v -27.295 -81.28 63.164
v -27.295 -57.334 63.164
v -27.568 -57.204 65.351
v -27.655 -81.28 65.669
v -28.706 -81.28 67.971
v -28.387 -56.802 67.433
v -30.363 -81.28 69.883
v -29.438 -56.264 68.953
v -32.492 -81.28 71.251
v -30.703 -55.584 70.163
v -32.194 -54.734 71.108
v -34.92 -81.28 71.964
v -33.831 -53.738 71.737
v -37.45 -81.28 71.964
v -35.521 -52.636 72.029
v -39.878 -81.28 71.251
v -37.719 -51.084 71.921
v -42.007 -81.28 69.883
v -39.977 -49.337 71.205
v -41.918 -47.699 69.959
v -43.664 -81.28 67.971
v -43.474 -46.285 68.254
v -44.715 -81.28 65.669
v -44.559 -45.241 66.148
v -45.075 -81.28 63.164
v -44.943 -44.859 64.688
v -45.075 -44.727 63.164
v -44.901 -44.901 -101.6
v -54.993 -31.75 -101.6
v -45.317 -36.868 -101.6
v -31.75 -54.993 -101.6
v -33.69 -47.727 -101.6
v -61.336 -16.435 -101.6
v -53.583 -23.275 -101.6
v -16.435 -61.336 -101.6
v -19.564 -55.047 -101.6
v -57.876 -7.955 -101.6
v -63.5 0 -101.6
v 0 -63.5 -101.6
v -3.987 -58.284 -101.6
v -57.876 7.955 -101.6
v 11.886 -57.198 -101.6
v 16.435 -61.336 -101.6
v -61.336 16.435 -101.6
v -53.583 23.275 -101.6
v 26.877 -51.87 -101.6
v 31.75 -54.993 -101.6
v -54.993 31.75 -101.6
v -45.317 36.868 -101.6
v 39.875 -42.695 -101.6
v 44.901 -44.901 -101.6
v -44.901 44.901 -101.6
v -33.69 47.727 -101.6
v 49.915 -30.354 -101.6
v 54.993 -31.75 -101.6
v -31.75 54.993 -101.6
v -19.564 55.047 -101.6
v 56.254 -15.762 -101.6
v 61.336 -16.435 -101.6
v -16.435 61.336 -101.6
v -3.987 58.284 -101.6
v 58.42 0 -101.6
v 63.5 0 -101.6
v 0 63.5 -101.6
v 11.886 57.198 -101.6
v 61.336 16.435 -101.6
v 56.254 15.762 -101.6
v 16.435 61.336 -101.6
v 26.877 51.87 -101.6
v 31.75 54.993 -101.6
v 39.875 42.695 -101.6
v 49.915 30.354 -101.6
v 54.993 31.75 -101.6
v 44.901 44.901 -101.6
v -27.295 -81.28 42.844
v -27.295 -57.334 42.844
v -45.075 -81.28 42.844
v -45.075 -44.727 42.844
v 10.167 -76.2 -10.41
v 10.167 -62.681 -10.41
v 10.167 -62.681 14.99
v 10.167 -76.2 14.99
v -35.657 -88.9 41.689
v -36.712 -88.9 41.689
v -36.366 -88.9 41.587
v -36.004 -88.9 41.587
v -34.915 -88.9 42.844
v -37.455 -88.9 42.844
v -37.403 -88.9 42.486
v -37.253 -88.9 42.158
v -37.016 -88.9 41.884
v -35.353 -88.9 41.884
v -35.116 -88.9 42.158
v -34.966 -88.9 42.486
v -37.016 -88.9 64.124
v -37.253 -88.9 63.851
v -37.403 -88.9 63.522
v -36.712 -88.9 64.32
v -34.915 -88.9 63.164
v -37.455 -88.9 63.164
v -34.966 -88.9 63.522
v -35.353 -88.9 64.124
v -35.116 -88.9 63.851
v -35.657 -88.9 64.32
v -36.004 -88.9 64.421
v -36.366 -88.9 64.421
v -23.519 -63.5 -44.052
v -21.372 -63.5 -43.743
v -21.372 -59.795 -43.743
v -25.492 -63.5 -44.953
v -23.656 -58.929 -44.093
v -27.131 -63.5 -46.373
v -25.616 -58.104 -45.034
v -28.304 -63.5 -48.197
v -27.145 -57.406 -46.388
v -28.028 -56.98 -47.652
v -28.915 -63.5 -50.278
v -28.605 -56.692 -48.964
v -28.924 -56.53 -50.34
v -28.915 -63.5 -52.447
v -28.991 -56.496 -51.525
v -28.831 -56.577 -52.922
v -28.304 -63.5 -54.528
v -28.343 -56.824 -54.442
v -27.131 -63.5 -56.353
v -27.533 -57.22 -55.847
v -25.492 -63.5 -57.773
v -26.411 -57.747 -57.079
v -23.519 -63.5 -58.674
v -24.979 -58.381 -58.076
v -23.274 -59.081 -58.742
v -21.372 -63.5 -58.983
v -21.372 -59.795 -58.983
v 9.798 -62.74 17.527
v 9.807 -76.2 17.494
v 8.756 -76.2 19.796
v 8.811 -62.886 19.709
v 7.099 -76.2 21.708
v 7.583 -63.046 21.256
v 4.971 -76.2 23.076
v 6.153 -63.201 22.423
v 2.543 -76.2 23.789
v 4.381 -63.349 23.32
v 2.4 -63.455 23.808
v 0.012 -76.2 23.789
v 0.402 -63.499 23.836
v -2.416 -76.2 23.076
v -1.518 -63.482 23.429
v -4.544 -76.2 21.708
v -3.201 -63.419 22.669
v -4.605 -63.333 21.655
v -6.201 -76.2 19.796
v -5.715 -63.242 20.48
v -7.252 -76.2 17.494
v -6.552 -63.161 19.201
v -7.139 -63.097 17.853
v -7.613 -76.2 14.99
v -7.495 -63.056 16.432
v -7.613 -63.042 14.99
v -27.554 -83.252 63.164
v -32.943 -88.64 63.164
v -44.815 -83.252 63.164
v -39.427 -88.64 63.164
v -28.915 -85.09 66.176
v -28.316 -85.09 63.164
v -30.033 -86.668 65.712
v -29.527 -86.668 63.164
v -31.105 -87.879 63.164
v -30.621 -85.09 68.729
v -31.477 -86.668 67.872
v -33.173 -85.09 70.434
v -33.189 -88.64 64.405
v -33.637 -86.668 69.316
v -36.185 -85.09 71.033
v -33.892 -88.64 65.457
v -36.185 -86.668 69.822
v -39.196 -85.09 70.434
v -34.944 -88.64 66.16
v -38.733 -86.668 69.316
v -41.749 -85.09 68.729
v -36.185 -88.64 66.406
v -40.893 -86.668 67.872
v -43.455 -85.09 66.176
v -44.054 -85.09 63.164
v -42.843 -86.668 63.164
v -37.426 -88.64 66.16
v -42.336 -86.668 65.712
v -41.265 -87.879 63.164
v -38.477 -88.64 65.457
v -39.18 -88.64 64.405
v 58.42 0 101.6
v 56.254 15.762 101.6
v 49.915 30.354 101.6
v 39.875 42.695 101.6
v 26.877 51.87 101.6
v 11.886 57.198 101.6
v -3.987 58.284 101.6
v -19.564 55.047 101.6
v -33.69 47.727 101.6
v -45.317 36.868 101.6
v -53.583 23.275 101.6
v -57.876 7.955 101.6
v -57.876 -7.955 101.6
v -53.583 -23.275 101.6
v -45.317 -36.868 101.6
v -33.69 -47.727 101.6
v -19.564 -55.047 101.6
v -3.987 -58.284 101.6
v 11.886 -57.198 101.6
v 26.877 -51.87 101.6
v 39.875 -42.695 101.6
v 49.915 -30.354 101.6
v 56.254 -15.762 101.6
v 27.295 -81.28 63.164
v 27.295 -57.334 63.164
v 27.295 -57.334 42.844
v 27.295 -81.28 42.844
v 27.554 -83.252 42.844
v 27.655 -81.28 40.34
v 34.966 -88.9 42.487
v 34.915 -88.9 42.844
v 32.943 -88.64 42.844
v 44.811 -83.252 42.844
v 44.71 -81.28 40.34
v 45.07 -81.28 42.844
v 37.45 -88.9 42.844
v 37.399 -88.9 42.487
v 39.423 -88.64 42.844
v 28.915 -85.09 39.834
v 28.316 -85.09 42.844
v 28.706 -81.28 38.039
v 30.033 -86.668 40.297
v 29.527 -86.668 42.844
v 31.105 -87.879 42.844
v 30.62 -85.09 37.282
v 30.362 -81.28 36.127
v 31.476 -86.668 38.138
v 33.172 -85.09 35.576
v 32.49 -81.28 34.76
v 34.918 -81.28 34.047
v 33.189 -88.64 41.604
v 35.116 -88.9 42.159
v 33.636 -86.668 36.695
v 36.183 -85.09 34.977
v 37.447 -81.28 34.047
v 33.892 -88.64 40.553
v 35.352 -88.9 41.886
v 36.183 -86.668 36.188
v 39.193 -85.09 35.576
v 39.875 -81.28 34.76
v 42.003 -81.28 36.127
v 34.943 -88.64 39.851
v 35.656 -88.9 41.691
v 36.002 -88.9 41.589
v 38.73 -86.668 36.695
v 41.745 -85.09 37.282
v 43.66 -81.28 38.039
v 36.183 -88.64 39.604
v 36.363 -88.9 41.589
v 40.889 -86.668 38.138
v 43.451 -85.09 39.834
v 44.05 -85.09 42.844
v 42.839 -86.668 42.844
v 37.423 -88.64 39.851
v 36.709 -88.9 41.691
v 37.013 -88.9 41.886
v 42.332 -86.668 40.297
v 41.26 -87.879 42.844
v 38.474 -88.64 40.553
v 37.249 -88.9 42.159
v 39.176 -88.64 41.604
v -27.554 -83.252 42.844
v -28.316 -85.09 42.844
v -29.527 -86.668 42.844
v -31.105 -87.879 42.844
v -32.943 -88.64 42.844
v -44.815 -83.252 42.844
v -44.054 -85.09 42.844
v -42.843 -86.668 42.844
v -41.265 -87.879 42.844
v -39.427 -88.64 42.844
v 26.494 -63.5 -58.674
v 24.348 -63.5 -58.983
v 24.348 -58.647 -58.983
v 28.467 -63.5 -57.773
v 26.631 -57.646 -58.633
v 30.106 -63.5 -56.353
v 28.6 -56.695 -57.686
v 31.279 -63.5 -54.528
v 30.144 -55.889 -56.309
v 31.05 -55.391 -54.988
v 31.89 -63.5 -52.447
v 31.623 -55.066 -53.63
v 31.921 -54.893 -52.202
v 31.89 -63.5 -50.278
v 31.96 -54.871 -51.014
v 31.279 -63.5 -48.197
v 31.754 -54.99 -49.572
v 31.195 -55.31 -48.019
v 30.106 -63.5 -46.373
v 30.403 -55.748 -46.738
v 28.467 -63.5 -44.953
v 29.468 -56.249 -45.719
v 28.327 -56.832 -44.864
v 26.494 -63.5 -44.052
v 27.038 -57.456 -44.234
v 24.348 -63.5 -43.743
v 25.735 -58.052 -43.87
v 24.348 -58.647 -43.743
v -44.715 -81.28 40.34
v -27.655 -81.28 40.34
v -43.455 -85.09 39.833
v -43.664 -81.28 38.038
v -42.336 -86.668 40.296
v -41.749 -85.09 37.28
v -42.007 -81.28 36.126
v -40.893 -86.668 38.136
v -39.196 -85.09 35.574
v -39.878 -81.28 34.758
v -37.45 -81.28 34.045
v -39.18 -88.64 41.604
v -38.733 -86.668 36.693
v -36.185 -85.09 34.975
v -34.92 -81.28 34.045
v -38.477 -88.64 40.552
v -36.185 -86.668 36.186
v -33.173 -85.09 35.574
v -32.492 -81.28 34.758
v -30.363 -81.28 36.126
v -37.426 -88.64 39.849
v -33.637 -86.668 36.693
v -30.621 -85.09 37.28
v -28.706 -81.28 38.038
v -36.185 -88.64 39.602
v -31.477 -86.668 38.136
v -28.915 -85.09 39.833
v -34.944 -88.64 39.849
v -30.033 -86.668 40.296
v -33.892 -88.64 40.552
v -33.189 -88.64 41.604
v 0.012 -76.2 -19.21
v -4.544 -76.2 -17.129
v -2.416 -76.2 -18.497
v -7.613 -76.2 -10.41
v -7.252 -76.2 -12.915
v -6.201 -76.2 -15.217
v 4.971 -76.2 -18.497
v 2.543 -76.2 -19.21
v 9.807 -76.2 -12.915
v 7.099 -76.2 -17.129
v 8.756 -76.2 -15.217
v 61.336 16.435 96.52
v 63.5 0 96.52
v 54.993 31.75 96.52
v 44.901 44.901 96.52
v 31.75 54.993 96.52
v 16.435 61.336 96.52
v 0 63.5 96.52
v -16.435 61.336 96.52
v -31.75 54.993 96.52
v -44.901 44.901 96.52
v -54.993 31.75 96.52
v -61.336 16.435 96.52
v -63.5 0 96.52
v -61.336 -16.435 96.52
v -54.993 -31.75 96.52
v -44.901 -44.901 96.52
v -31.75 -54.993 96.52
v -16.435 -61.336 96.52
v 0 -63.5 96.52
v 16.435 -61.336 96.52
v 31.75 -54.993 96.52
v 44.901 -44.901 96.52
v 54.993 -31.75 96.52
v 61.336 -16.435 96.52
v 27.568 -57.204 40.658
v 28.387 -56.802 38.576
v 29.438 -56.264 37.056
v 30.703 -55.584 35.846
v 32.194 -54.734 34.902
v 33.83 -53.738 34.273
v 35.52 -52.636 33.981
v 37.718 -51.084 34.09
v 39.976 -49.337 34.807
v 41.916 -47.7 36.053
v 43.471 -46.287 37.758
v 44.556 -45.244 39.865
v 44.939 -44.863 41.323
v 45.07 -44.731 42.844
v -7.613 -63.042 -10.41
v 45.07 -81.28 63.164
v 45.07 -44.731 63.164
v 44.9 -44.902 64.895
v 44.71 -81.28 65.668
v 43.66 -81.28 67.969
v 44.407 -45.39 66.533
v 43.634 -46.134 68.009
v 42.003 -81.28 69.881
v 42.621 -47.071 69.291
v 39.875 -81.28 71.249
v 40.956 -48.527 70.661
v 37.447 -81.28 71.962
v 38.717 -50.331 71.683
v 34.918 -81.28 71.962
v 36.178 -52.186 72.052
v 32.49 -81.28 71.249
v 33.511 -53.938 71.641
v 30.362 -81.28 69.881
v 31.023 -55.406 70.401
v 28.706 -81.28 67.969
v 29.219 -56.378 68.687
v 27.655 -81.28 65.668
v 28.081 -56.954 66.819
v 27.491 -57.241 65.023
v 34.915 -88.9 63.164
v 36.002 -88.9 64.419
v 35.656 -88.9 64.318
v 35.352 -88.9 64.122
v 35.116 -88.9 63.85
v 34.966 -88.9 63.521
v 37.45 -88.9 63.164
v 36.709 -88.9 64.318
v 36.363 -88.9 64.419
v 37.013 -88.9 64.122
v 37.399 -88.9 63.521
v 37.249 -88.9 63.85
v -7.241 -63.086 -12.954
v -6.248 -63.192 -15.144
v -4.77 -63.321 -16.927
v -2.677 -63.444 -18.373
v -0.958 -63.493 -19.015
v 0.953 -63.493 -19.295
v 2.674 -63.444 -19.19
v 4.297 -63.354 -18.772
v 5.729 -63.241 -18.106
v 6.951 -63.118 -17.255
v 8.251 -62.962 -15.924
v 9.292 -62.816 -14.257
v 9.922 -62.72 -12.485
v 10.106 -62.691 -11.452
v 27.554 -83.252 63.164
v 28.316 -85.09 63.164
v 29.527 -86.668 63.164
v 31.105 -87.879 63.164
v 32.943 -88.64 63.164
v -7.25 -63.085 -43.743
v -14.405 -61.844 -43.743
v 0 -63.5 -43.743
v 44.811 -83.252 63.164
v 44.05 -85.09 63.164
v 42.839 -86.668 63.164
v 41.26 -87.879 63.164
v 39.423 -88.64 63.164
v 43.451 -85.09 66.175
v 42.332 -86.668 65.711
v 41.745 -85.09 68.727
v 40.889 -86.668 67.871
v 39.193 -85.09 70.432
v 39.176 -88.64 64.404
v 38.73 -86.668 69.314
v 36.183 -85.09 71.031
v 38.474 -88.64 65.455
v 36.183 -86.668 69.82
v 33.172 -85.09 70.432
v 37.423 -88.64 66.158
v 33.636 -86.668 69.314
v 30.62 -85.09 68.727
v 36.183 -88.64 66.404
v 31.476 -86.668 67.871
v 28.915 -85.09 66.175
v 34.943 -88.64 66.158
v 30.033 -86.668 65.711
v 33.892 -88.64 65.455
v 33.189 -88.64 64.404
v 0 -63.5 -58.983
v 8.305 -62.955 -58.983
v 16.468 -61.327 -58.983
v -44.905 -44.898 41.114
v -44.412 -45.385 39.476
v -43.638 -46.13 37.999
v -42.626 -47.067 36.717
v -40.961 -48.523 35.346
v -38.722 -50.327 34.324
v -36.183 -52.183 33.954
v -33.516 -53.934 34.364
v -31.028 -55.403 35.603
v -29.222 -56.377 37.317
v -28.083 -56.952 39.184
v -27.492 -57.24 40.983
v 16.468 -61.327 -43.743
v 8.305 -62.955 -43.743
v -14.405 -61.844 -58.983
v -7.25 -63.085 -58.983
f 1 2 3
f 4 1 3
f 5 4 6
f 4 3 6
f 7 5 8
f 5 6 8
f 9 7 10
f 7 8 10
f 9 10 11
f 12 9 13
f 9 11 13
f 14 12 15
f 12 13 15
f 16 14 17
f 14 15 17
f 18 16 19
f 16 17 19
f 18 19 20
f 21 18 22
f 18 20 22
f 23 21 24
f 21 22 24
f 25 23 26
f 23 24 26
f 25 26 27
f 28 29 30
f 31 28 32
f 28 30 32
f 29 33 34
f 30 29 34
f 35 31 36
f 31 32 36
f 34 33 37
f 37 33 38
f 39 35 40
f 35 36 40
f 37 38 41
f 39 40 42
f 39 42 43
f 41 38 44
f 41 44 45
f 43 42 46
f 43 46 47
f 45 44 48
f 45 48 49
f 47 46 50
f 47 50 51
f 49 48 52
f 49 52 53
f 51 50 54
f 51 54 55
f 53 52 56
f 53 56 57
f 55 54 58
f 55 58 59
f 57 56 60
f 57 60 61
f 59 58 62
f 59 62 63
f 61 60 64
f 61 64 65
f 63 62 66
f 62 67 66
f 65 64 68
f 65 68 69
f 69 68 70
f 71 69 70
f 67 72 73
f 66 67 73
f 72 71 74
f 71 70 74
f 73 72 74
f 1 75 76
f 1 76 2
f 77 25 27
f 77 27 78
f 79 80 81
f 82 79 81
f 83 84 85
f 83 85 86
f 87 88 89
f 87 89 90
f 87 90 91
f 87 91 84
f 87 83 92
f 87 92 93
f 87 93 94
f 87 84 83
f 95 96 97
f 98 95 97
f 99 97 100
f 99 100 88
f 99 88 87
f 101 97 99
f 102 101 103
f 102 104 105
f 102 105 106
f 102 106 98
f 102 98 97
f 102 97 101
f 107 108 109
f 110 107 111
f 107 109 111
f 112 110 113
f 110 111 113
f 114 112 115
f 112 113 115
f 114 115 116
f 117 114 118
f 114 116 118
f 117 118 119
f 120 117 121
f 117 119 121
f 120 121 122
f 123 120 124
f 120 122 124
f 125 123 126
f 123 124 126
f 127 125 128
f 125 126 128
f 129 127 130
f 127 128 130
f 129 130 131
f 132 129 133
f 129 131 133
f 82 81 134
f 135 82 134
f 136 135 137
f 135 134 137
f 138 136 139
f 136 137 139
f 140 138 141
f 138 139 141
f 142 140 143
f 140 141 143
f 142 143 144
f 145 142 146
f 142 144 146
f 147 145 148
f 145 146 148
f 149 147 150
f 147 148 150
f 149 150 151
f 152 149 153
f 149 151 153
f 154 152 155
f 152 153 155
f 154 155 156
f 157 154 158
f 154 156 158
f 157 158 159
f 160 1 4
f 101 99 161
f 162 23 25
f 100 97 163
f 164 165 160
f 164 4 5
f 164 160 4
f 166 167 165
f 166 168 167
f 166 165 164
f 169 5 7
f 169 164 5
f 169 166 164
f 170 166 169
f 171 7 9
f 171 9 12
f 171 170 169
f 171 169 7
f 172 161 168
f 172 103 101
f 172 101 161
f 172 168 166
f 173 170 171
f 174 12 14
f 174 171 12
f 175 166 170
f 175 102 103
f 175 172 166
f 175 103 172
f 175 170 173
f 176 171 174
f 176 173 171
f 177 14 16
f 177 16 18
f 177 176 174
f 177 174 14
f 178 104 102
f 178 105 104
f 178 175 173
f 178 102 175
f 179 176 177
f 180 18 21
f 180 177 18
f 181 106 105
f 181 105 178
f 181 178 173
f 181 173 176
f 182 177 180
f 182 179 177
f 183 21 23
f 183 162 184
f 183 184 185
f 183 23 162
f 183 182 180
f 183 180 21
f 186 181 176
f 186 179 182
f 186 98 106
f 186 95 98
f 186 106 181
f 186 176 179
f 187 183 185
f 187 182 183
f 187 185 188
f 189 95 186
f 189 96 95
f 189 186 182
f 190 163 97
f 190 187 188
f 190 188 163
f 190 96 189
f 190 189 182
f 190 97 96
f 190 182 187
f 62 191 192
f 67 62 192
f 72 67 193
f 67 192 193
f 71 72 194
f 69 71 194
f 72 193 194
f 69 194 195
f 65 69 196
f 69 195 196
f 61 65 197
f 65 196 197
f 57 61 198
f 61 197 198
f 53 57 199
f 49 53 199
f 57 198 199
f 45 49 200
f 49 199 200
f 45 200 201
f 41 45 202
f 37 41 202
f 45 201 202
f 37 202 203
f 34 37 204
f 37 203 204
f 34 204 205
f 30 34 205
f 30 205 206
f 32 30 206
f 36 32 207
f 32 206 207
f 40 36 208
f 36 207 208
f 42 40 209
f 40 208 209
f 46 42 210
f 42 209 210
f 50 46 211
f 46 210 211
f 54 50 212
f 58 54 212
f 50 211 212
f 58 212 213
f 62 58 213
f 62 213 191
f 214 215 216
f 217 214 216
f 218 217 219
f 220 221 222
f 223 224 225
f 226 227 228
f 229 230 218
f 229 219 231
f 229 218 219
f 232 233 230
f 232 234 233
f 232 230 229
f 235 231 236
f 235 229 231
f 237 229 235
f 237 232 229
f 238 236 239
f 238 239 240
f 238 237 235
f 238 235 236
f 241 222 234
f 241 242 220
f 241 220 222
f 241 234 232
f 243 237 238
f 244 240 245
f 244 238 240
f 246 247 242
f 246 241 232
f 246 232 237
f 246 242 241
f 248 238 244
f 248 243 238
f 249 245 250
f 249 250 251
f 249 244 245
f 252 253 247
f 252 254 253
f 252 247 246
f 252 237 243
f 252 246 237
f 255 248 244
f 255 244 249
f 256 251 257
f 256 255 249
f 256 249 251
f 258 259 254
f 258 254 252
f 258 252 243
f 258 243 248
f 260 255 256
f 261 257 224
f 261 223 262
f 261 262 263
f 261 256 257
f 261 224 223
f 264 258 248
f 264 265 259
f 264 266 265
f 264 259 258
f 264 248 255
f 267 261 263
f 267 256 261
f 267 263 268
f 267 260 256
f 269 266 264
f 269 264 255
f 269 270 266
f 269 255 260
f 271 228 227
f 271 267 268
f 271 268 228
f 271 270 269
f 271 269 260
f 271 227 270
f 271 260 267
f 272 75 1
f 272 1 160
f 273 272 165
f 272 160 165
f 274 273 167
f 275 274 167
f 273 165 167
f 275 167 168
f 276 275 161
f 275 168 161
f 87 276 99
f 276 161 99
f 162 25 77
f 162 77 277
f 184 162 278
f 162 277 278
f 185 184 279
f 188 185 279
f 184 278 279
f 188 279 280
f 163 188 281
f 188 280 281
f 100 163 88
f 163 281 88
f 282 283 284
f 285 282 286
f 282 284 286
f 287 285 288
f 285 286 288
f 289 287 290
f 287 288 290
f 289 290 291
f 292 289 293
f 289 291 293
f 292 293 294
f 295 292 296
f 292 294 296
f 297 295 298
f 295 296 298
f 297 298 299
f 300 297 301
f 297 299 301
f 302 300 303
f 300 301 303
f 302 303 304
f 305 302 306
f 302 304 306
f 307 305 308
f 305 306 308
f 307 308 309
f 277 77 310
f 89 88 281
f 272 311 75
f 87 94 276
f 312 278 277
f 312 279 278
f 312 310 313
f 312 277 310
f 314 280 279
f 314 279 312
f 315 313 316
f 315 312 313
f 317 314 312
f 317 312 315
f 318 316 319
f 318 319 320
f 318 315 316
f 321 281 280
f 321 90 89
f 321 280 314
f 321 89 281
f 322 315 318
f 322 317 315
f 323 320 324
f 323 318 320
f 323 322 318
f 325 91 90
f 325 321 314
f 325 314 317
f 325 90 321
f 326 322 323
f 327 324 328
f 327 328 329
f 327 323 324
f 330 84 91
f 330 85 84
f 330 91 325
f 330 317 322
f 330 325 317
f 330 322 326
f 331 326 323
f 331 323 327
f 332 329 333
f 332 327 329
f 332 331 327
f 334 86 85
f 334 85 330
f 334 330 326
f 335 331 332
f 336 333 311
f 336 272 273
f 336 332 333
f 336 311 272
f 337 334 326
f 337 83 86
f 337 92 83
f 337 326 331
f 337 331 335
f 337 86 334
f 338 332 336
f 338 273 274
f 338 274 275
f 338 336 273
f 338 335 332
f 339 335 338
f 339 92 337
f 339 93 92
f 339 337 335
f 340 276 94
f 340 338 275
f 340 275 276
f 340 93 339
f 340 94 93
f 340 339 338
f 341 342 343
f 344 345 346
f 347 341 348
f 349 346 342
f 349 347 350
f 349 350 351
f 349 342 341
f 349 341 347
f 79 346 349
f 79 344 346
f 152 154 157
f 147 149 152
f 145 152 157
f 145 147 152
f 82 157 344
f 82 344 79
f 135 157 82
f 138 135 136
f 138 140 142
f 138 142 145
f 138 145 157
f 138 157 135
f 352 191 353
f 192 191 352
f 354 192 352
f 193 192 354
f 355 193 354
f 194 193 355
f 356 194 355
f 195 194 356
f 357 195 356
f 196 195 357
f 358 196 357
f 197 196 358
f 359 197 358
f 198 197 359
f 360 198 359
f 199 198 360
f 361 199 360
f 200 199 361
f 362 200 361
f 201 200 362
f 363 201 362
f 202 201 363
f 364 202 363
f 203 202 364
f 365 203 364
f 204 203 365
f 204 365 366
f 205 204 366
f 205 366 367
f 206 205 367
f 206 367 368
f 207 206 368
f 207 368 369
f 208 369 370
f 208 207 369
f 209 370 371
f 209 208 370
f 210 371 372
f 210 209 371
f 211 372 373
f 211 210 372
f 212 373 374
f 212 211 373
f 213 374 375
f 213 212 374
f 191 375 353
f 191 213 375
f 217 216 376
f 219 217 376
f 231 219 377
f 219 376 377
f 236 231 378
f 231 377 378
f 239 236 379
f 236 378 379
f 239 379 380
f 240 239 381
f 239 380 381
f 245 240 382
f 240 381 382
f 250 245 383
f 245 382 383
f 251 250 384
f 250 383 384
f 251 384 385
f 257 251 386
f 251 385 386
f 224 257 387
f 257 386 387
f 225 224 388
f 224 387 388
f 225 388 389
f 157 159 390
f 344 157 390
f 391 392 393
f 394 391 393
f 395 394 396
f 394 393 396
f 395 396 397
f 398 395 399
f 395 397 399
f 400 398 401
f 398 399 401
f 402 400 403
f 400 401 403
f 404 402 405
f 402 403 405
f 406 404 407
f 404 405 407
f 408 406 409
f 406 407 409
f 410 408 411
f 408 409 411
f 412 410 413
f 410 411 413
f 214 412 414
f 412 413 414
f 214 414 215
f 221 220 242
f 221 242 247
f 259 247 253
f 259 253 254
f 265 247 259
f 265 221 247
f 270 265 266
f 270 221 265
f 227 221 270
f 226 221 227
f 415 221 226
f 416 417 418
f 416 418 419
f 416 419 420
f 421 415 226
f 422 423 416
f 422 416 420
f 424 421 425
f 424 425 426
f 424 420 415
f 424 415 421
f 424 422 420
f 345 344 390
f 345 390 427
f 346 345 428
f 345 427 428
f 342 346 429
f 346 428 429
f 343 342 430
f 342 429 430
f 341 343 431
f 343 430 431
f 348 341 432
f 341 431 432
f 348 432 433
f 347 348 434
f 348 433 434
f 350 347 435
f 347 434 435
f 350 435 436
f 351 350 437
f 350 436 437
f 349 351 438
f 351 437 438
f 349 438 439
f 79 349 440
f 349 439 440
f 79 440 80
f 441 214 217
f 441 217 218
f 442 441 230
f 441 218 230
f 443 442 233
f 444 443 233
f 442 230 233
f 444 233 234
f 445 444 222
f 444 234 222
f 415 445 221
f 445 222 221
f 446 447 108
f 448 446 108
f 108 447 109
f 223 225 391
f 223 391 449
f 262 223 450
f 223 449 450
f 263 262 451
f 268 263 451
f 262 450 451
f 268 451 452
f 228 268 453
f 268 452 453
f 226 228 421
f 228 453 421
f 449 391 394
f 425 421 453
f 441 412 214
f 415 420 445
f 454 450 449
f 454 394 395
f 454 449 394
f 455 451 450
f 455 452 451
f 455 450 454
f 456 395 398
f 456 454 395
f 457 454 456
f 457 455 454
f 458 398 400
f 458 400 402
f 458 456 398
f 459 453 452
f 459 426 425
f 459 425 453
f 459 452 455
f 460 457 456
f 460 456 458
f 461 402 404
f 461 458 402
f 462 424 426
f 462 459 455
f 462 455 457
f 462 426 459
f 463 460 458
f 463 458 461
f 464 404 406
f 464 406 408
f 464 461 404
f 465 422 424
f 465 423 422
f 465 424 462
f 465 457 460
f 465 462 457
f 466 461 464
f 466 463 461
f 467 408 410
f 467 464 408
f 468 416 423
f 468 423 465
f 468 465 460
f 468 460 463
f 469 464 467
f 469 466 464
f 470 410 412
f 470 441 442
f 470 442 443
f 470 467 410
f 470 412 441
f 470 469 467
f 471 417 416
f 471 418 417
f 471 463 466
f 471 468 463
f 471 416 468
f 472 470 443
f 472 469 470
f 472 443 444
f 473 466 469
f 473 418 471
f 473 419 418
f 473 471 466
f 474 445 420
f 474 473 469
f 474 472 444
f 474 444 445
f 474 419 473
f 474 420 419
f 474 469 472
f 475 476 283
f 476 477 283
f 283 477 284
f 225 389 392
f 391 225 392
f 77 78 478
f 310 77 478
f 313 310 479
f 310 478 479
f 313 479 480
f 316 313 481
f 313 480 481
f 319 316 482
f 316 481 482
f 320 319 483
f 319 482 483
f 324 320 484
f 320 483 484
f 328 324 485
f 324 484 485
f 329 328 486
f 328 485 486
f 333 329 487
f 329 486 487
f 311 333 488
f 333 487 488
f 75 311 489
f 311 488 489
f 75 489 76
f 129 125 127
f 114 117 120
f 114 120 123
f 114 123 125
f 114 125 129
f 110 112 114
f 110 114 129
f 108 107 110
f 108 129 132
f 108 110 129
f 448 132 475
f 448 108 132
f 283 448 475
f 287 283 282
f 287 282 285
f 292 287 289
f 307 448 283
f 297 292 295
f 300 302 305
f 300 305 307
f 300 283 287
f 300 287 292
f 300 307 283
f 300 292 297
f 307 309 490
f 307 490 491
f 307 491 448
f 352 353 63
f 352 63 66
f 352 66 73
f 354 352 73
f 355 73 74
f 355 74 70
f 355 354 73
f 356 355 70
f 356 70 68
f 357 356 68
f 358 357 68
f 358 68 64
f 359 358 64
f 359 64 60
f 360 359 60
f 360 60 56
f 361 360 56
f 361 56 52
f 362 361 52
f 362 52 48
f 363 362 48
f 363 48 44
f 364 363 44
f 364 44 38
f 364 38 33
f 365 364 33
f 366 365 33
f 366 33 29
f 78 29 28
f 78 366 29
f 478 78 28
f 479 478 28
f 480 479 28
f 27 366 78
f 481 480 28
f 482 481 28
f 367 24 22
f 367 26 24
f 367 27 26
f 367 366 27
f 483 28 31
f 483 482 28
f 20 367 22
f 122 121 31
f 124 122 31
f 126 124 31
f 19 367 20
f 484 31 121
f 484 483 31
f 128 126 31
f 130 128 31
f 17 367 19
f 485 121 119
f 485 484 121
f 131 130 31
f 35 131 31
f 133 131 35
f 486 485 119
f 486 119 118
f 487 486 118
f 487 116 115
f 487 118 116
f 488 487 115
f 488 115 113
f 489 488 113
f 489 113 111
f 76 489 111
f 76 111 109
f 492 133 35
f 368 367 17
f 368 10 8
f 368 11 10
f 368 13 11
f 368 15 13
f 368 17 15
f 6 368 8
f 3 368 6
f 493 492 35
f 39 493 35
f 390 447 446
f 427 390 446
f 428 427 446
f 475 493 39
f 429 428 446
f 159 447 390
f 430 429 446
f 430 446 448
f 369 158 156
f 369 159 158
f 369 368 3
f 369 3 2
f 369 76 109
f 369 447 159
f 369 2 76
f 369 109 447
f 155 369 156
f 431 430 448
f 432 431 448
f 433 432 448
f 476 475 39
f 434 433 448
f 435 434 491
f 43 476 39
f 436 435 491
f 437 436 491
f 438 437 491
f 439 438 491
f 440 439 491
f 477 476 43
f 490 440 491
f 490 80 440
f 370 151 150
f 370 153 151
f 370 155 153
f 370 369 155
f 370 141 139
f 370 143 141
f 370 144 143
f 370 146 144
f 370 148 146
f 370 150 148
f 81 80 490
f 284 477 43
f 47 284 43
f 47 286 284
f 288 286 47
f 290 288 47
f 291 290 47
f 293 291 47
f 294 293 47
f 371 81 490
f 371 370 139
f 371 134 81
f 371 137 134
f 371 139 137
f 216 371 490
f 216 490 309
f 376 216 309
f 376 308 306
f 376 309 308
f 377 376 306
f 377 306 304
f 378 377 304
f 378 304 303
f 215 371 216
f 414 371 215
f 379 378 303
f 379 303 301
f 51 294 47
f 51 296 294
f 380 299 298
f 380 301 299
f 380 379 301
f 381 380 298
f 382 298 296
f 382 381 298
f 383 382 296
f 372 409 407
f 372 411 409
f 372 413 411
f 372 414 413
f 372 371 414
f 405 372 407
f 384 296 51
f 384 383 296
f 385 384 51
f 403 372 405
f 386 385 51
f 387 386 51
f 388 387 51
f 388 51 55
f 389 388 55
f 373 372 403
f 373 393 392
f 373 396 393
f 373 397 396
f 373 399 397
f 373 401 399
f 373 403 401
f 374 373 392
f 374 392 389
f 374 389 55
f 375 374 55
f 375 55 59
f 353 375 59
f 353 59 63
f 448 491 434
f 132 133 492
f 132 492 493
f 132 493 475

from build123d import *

# Parameters (mm, degrees)
F0_R     = 63.5
F1_DEPTH = 101.6
F2_SIZE  = 5.08
F4_DEPTH = 88.9
F6_DEPTH = 76.2
F8_DEPTH = 63.5
F9_DEPTH = 203.2
F11_R    = 7.62


with BuildPart() as f1:
    # F0 (on Top) → F1 (new body, symmetric)
    with BuildSketch(Plane.XY):
        Circle(F0_R)
    extrude(amount=F1_DEPTH, both=True)

    # F2
    f2_edges = [f1.edges().sort_by_distance(p)[0] for p in [
        (-63.5, 0, 101.6),
    ]]
    chamfer(f2_edges, length=F2_SIZE)

    # F3 (on Front) → F4 (join)
    with BuildSketch(Plane.XZ):
        with BuildLine():
            ThreePointArc((-27.294820104, 63.1642854473), (-36.184820104, 72.0542854473), (-45.074820104, 63.1642854473))
            Line((-45.074820104, 63.1642854473), (-45.074820104, 42.8442854473))
            ThreePointArc((-45.074820104, 42.8442854473), (-36.184820104, 33.9542854473), (-27.294820104, 42.8442854473))
            Line((-27.294820104, 42.8442854473), (-27.294820104, 63.1642854473))
        make_face()
        with BuildLine():
            ThreePointArc((45.070431488, 63.1642854473), (36.182625796, 72.0520911393), (27.294820104, 63.1642854473))
            Line((27.294820104, 63.1642854473), (27.294820104, 42.8442854473))
            ThreePointArc((27.294820104, 42.8442854473), (36.182625796, 33.9564797553), (45.070431488, 42.8442854473))
            Line((45.070431488, 42.8442854473), (45.070431488, 63.1642854473))
        make_face()
    extrude(amount=F4_DEPTH)

    # F5 (on Front) → F6 (join)
    with BuildSketch(Plane.XZ):
        with BuildLine():
            ThreePointArc((10.1674738791, 14.9895709281), (1.2774738791, 23.8795709281), (-7.6125261209, 14.9895709281))
            Line((-7.6125261209, 14.9895709281), (-7.6125261209, -10.4104290719))
            ThreePointArc((-7.6125261209, -10.4104290719), (1.2774738791, -19.3004290719), (10.1674738791, -10.4104290719))
            Line((10.1674738791, -10.4104290719), (10.1674738791, 14.9895709281))
        make_face()
    extrude(amount=F6_DEPTH)

    # F7 (on Front) → F8 (join)
    with BuildSketch(Plane.XZ):
        with BuildLine():
            Line((24.3475708148, -43.7428626594), (-21.3724291852, -43.7428626594))
            ThreePointArc((-21.3724291852, -43.7428626594), (-28.9924291852, -51.3628626594), (-21.3724291852, -58.9828626594))
            Line((-21.3724291852, -58.9828626594), (24.3475708148, -58.9828626594))
            ThreePointArc((24.3475708148, -58.9828626594), (31.9675708148, -51.3628626594), (24.3475708148, -43.7428626594))
        make_face()
    extrude(amount=F8_DEPTH)

    # F9 (cut, through all): a face of the model
    f9_faces = [f1.faces().sort_by_distance(p)[0] for p in [
        (0, 0, 101.6),
    ]]
    extrude(f9_faces, amount=-F9_DEPTH, mode=Mode.SUBTRACT)

    # F11
    f11_edges = [f1.edges().sort_by_distance(p)[0] for p in [
        (-36.18482, -88.9, 72.054285),
        (-27.29482, -88.9, 53.004285),
        (36.182626, -88.9, 33.95648),
        (27.29482, -88.9, 53.004285),
    ]]
    fillet(f11_edges, radius=F11_R)


solid = f1.part
